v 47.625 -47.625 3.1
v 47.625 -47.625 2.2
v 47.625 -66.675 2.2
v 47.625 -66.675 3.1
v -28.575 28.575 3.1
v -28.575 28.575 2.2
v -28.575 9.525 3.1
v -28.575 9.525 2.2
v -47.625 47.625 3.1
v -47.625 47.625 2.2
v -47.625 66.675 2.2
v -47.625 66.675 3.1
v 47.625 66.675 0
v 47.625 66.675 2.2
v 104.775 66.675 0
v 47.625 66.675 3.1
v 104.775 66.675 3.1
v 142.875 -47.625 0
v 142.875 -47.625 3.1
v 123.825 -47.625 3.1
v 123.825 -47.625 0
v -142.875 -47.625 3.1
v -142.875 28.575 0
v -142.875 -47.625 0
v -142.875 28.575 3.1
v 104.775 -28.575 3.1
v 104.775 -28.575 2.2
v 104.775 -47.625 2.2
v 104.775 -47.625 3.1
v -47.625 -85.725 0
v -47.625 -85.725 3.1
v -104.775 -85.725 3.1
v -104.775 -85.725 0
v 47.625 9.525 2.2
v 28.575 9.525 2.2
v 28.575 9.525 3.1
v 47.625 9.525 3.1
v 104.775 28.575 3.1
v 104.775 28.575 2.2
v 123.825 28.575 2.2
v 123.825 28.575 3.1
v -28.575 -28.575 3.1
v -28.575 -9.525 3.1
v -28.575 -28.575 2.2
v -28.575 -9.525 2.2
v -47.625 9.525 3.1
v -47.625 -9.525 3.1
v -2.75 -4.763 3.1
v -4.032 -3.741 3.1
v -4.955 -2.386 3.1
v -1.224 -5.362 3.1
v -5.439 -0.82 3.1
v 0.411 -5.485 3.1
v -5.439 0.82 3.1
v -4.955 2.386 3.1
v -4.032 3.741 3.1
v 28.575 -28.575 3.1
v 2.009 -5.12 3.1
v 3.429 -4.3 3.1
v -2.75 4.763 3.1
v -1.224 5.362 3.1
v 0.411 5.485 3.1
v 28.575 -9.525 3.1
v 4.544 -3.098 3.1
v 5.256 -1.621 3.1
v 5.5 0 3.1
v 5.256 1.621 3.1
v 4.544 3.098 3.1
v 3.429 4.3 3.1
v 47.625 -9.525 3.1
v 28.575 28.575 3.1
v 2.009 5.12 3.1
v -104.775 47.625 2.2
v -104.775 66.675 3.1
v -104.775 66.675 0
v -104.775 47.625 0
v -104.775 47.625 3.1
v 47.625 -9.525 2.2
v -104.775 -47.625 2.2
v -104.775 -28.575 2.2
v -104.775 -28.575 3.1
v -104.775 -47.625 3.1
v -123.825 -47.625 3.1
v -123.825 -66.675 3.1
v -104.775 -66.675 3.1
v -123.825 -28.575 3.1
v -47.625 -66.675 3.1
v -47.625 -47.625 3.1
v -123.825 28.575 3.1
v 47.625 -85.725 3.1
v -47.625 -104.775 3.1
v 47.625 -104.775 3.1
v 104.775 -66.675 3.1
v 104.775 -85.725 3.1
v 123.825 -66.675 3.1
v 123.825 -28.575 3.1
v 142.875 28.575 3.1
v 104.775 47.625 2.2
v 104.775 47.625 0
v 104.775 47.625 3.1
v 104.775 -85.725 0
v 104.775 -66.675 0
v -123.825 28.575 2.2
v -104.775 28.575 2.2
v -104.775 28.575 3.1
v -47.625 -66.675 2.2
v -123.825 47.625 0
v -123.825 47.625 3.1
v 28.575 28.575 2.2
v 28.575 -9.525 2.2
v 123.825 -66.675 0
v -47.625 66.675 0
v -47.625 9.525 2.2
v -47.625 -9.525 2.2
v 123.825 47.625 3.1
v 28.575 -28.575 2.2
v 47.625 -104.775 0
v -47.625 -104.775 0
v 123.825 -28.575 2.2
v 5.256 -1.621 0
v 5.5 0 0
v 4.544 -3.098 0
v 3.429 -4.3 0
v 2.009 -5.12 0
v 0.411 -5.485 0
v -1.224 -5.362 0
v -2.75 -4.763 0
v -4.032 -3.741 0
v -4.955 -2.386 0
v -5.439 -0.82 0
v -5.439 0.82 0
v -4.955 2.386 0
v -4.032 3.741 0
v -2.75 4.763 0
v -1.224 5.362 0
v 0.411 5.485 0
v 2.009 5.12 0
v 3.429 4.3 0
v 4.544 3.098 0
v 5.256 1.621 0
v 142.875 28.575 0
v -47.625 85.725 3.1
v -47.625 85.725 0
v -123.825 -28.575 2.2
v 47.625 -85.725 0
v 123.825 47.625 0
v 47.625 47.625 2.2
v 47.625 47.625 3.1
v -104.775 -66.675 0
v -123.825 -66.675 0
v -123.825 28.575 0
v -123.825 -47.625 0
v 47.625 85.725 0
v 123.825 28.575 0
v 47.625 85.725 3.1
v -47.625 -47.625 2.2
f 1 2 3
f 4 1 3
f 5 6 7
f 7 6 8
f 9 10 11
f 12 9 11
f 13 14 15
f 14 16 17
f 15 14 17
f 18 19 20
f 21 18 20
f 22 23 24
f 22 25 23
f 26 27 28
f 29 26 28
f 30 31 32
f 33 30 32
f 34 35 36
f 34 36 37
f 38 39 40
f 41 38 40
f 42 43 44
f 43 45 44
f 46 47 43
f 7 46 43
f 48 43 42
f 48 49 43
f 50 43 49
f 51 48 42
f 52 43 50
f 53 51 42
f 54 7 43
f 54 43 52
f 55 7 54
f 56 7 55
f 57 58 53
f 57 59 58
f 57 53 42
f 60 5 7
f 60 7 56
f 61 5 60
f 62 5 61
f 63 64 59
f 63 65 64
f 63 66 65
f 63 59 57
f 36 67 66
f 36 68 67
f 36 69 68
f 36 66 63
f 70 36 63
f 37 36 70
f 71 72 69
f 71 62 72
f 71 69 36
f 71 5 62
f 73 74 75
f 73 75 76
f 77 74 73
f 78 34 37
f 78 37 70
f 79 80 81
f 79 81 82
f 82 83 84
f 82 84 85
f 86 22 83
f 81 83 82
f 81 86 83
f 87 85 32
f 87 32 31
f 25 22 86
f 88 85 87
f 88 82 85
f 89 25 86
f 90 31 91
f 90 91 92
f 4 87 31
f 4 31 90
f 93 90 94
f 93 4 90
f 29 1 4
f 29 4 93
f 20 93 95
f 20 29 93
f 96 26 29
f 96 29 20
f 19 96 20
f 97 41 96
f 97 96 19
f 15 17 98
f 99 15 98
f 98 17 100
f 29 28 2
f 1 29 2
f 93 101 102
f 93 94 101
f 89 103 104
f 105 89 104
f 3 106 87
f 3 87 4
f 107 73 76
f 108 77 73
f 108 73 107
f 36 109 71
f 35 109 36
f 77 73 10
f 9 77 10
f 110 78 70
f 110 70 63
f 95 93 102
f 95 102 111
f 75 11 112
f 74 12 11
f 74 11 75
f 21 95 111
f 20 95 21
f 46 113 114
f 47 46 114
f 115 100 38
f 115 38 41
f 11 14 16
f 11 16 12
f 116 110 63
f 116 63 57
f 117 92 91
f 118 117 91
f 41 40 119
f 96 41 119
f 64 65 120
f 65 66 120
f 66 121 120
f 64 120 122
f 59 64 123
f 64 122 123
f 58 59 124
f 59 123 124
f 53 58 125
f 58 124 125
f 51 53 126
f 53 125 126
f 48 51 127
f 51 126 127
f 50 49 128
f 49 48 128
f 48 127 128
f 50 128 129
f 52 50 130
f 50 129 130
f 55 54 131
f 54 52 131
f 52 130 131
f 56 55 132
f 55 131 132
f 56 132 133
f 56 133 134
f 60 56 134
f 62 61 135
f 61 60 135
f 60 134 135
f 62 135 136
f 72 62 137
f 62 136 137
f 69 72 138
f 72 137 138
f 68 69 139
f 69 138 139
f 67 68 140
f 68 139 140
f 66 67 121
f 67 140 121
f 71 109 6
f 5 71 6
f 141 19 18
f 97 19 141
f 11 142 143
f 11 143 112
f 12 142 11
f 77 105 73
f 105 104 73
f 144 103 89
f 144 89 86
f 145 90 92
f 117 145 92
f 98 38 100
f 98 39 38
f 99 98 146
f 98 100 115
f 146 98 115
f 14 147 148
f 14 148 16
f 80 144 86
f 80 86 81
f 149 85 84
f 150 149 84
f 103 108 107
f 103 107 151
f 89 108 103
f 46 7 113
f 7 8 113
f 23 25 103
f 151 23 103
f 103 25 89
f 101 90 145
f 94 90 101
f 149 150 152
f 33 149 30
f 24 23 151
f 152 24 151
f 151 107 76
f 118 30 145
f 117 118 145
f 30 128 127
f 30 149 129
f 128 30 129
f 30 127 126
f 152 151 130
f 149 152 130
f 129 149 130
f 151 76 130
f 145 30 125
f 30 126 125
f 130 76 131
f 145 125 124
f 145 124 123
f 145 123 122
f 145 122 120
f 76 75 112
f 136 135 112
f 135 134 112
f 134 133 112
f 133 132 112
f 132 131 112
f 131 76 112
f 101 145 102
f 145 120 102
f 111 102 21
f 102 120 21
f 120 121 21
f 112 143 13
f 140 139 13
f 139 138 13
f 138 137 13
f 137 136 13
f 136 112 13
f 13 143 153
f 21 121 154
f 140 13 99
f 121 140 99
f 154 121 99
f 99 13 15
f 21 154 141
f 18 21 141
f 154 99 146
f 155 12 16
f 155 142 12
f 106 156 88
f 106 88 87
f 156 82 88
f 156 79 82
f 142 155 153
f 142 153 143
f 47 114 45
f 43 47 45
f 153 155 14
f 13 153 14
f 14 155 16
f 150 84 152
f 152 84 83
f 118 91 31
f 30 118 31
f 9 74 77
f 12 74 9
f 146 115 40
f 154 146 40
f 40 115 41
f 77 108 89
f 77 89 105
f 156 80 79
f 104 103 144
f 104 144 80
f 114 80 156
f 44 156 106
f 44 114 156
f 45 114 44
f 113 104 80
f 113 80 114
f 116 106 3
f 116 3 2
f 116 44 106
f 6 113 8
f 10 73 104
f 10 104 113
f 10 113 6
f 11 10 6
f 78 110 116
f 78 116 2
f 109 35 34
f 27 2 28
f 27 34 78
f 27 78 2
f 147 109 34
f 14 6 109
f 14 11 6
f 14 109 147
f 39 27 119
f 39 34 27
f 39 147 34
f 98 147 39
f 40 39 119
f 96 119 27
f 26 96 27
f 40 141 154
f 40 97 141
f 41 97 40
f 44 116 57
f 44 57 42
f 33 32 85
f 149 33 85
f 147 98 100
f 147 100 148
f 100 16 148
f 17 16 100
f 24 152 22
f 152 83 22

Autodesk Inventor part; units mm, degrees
ref_plane "YZ Plane" through (0, 0, 0) normal (1, 0, 0) x (0, 1, 0)
ref_plane "XZ Plane" through (0, 0, 0) normal (0, 1, 0) x (-1, 0, 0)
ref_plane "XY Plane" through (0, 0, 0) normal (0, 0, 1) x (1, 0, 0)
sketch "Sketch1" plane through (0, 0, 0) normal (0, 0, 1) x (1, 0, 0)
  circle A0 centre (0, 0) radius 152.4
  circle A1 centre (0, 0) radius 5.5
  dimension "d0" = 304.8
  dimension "d1" = 11
extrude "Extrusion1" add sketch "Sketch1" along normal blind 2.2
fillet "Fillet1" radius 1.1 2 edges at (-152.4, 0, 0) (-152.4, 0, 2.2)
sketch "Sketch2" plane through (0, 0, 2.2) normal (0, 0, 1) x (1, 0, 0)
  line L0 (206.2137, 42.4617) -> (289.822, 42.4617) construction
  line L1 (289.822, 42.4617) -> (289.822, -13.3654) construction
  line L2 (289.822, -13.3654) -> (206.2137, -13.3654) construction
  line L3 (206.2137, -13.3654) -> (206.2137, 42.4617) construction
  line L4 (9.525, 9.525) -> (-9.525, 9.525)
  line L5 (-9.525, 9.525) -> (-9.525, -9.525)
  line L6 (-9.525, -9.525) -> (9.525, -9.525)
  line L7 (9.525, -9.525) -> (9.525, 9.525)
  line L8 (-123.825, 28.575) -> (-104.775, 28.575)
  line L9 (-85.725, 28.575) -> (-66.675, 28.575)
  line L10 (-85.725, 28.575) -> (-104.775, 28.575)
  line L11 (-9.525, 28.575) -> (-28.575, 28.575)
  line L12 (-47.625, 28.575) -> (-28.575, 28.575)
  line L13 (-47.625, 28.575) -> (-66.675, 28.575)
  line L14 (-9.525, 9.525) -> (-9.525, 28.575)
  line L15 (-9.525, 28.575) -> (9.525, 28.575)
  line L16 (9.525, 28.575) -> (9.525, 9.525)
  line L17 (-9.525, -28.575) -> (-9.525, -9.525)
  line L18 (9.525, -9.525) -> (9.525, -28.575)
  line L19 (-123.825, -47.625) -> (-142.875, -47.625)
  line L20 (-123.825, -47.625) -> (-104.775, -47.625)
  line L21 (-85.725, -47.625) -> (-104.775, -47.625)
  line L22 (-85.725, -47.625) -> (-66.675, -47.625)
  line L23 (-47.625, -47.625) -> (-66.675, -47.625)
  line L24 (-47.625, -47.625) -> (-28.575, -47.625)
  line L25 (-9.525, -47.625) -> (-28.575, -47.625)
  line L26 (-9.525, -28.575) -> (-9.525, -47.625)
  line L27 (9.525, -47.625) -> (9.525, -28.575)
  line L28 (142.875, 28.575) -> (123.825, 28.575)
  line L29 (104.775, 28.575) -> (123.825, 28.575)
  line L30 (104.775, 28.575) -> (85.725, 28.575)
  line L31 (66.675, 28.575) -> (85.725, 28.575)
  line L32 (66.675, 28.575) -> (47.625, 28.575)
  line L33 (28.575, 28.575) -> (47.625, 28.575)
  line L34 (28.575, 28.575) -> (9.525, 28.575)
  line L35 (104.775, -47.625) -> (123.825, -47.625)
  line L36 (104.775, -47.625) -> (85.725, -47.625)
  line L37 (142.875, -47.625) -> (123.825, -47.625)
  line L38 (66.675, -47.625) -> (85.725, -47.625)
  line L39 (66.675, -47.625) -> (47.625, -47.625)
  line L40 (28.575, -47.625) -> (47.625, -47.625)
  line L41 (28.575, -47.625) -> (9.525, -47.625)
  line L42 (0, 9.525) -> (0, -9.525)
  line L43 (-9.525, 0) -> (9.525, 0)
  line L44 (0, 0) -> (-4.1012, 3.8959)
  line L45 (-142.875, 28.575) -> (-123.825, 28.575)
  line L46 (-123.825, 28.575) -> (-123.825, 9.525)
  line L47 (-123.825, 9.525) -> (-142.875, 9.525)
  line L48 (-142.875, 9.525) -> (-142.875, 28.575)
  line L49 (-142.875, -9.525) -> (-123.825, -9.525)
  line L50 (-123.825, -9.525) -> (-123.825, 9.525)
  line L51 (-142.875, 9.525) -> (-142.875, -9.525)
  line L52 (-123.825, -47.625) -> (-123.825, -28.575)
  line L53 (-123.825, -28.575) -> (-142.875, -28.575)
  line L54 (-142.875, -28.575) -> (-142.875, -47.625)
  line L55 (-123.825, -9.525) -> (-123.825, -28.575)
  line L56 (-142.875, -28.575) -> (-142.875, -9.525)
  line L57 (123.825, -47.625) -> (142.875, -47.625)
  line L58 (142.875, 28.575) -> (123.825, 28.575)
  line L59 (123.825, 28.575) -> (123.825, 9.525)
  line L60 (123.825, 9.525) -> (142.875, 9.525)
  line L61 (142.875, 9.525) -> (142.875, 28.575)
  line L62 (123.825, -9.525) -> (123.825, 9.525)
  line L63 (142.875, -9.525) -> (123.825, -9.525)
  line L64 (142.875, 9.525) -> (142.875, -9.525)
  line L65 (123.825, -9.525) -> (123.825, -28.575)
  line L66 (123.825, -47.625) -> (123.825, -28.575)
  line L67 (142.875, -28.575) -> (142.875, -9.525)
  line L68 (123.825, -28.575) -> (142.875, -28.575)
  line L69 (142.875, -28.575) -> (142.875, -47.625)
  line L70 (-123.825, 28.575) -> (-104.775, 28.575)
  line L71 (-104.775, 28.575) -> (-104.775, 47.625)
  line L72 (-104.775, 47.625) -> (-123.825, 47.625)
  line L73 (-123.825, 47.625) -> (-123.825, 28.575)
  line L74 (123.825, 28.575) -> (104.775, 28.575)
  line L75 (104.775, 28.575) -> (104.775, 47.625)
  line L76 (104.775, 47.625) -> (123.825, 47.625)
  line L77 (123.825, 47.625) -> (123.825, 28.575)
  line L78 (123.825, -47.625) -> (104.775, -47.625)
  line L79 (104.775, -47.625) -> (104.775, -66.675)
  line L80 (104.775, -66.675) -> (123.825, -66.675)
  line L81 (123.825, -66.675) -> (123.825, -47.625)
  line L82 (-123.825, -47.625) -> (-104.775, -47.625)
  line L83 (-104.775, -47.625) -> (-104.775, -66.675)
  line L84 (-104.775, -66.675) -> (-123.825, -66.675)
  line L85 (-123.825, -66.675) -> (-123.825, -47.625)
  line L86 (104.775, -66.675) -> (85.725, -66.675)
  line L87 (85.725, -66.675) -> (85.725, -85.725)
  line L88 (85.725, -85.725) -> (104.775, -85.725)
  line L89 (104.775, -85.725) -> (104.775, -66.675)
  line L90 (-104.775, -66.675) -> (-85.725, -66.675)
  line L91 (-85.725, -66.675) -> (-85.725, -85.725)
  line L92 (-85.725, -85.725) -> (-104.775, -85.725)
  line L93 (-104.775, -85.725) -> (-104.775, -66.675)
  line L94 (-66.675, -66.675) -> (-85.725, -66.675)
  line L95 (-85.725, -85.725) -> (-66.675, -85.725)
  line L96 (-66.675, -85.725) -> (-66.675, -66.675)
  line L97 (-47.625, -66.675) -> (-47.625, -85.725)
  line L98 (-47.625, -85.725) -> (-66.675, -85.725)
  line L99 (-66.675, -66.675) -> (-47.625, -66.675)
  line L100 (66.675, -66.675) -> (85.725, -66.675)
  line L101 (85.725, -85.725) -> (66.675, -85.725)
  line L102 (66.675, -85.725) -> (66.675, -66.675)
  line L103 (47.625, -66.675) -> (47.625, -85.725)
  line L104 (66.675, -66.675) -> (47.625, -66.675)
  line L105 (47.625, -85.725) -> (66.675, -85.725)
  line L106 (-47.625, -85.725) -> (-28.575, -85.725)
  line L107 (-28.575, -85.725) -> (-28.575, -104.775)
  line L108 (-28.575, -104.775) -> (-47.625, -104.775)
  line L109 (-47.625, -104.775) -> (-47.625, -85.725)
  line L110 (-9.525, -85.725) -> (-28.575, -85.725)
  line L111 (-28.575, -104.775) -> (-9.525, -104.775)
  line L112 (-9.525, -104.775) -> (-9.525, -85.725)
  line L113 (28.575, -85.725) -> (9.525, -85.725)
  line L114 (9.525, -85.725) -> (9.525, -104.775)
  line L115 (9.525, -104.775) -> (28.575, -104.775)
  line L116 (28.575, -104.775) -> (28.575, -85.725)
  line L117 (-9.525, -85.725) -> (9.525, -85.725)
  line L118 (9.525, -104.775) -> (-9.525, -104.775)
  line L119 (28.575, -85.725) -> (47.625, -85.725)
  line L120 (47.625, -85.725) -> (47.625, -104.775)
  line L121 (47.625, -104.775) -> (28.575, -104.775)
  line L122 (-104.775, 47.625) -> (-85.725, 47.625)
  line L123 (-85.725, 47.625) -> (-85.725, 66.675)
  line L124 (-85.725, 66.675) -> (-104.775, 66.675)
  line L125 (-104.775, 66.675) -> (-104.775, 47.625)
  line L126 (104.775, 47.625) -> (85.725, 47.625)
  line L127 (85.725, 47.625) -> (85.725, 66.675)
  line L128 (85.725, 66.675) -> (104.775, 66.675)
  line L129 (104.775, 66.675) -> (104.775, 47.625)
  line L130 (-66.675, 47.625) -> (-85.725, 47.625)
  line L131 (-85.725, 66.675) -> (-66.675, 66.675)
  line L132 (-66.675, 66.675) -> (-66.675, 47.625)
  line L133 (-47.625, 47.625) -> (-47.625, 66.675)
  line L134 (-66.675, 47.625) -> (-47.625, 47.625)
  line L135 (-47.625, 66.675) -> (-66.675, 66.675)
  line L136 (66.675, 47.625) -> (85.725, 47.625)
  line L137 (85.725, 66.675) -> (66.675, 66.675)
  line L138 (66.675, 66.675) -> (66.675, 47.625)
  line L139 (47.625, 47.625) -> (47.625, 66.675)
  line L140 (66.675, 47.625) -> (47.625, 47.625)
  line L141 (47.625, 66.675) -> (66.675, 66.675)
  line L142 (-47.625, 66.675) -> (-28.575, 66.675)
  line L143 (-28.575, 66.675) -> (-28.575, 85.725)
  line L144 (-28.575, 85.725) -> (-47.625, 85.725)
  line L145 (-47.625, 85.725) -> (-47.625, 66.675)
  line L146 (47.625, 66.675) -> (28.575, 66.675)
  line L147 (28.575, 66.675) -> (28.575, 85.725)
  line L148 (28.575, 85.725) -> (47.625, 85.725)
  line L149 (47.625, 85.725) -> (47.625, 66.675)
  line L150 (-9.525, 66.675) -> (-28.575, 66.675)
  line L151 (-28.575, 85.725) -> (-9.525, 85.725)
  line L152 (-9.525, 85.725) -> (-9.525, 66.675)
  line L153 (28.575, 66.675) -> (9.525, 66.675)
  line L154 (9.525, 66.675) -> (9.525, 85.725)
  line L155 (9.525, 85.725) -> (28.575, 85.725)
  line L156 (28.575, 85.725) -> (28.575, 66.675)
  line L157 (-9.525, 66.675) -> (9.525, 66.675)
  line L158 (9.525, 85.725) -> (-9.525, 85.725)
  circle A0 centre (0, 0) radius 225.16
  point P0 (-123.825, -9.525)
  point P1 (-123.825, -47.625)
  point P2 (123.825, -9.525)
  dimension "d22" = 19.05
  dimension "d23" = 19.05
  dimension "d29" = 19.05
  dimension "d30" = 19.05
  dimension "d31" = 19.05
  dimension "d32" = 19.05
  dimension "d33" = 19.05
  dimension "d34" = 19.05
  dimension "d35" = 19.05
  dimension "d36" = 19.05
  dimension "d39" = 19.05
  dimension "d40" = 19.05
  dimension "d45" = 19.05
  dimension "d46" = 19.05
  dimension "d50" = 19.05
  dimension "d51" = 19.05
  dimension "d52" = 19.05
  dimension "d53" = 19.05
  dimension "d58" = 19.05
  dimension "d59" = 19.05
  dimension "d60" = 19.05
  dimension "d61" = 19.05
extrude "Extrusion2" cut sketch "Sketch2" against normal blind 25.4
sketch "Sketch3" plane through (0, 0, 2.2) normal (0, 0, 1) x (1, 0, 0)
  line L0 (194.8549, 38.1597) -> (278.4632, 38.1597) construction
  line L1 (278.4632, 38.1597) -> (278.4632, -17.6674) construction
  line L2 (278.4632, -17.6674) -> (194.8549, -17.6674) construction
  line L3 (194.8549, -17.6674) -> (194.8549, 38.1597) construction
  line L4 (-123.825, 28.575) -> (-104.775, 28.575)
  line L5 (-123.825, -47.625) -> (-142.875, -47.625)
  line L6 (104.775, 28.575) -> (123.825, 28.575)
  line L7 (142.875, 28.575) -> (123.825, 28.575)
  line L8 (142.875, -47.625) -> (123.825, -47.625)
  line L9 (-142.875, 28.575) -> (-123.825, 28.575)
  line L10 (-123.825, 28.575) -> (-123.825, 9.525)
  line L11 (-142.875, 9.525) -> (-142.875, 28.575)
  line L12 (-123.825, -9.525) -> (-123.825, 9.525)
  line L13 (-142.875, 9.525) -> (-142.875, -9.525)
  line L14 (-123.825, -9.525) -> (-123.825, -28.575)
  line L15 (-142.875, -28.575) -> (-142.875, -9.525)
  line L16 (-142.875, -28.575) -> (-142.875, -47.625)
  line L17 (123.825, -9.525) -> (123.825, 9.525)
  line L18 (142.875, 9.525) -> (142.875, -9.525)
  line L19 (123.825, 28.575) -> (123.825, 9.525)
  line L20 (142.875, 9.525) -> (142.875, 28.575)
  line L21 (142.875, 28.575) -> (123.825, 28.575)
  line L22 (123.825, -9.525) -> (123.825, -28.575)
  line L23 (142.875, -28.575) -> (142.875, -9.525)
  line L24 (142.875, -28.575) -> (142.875, -47.625)
  line L25 (123.825, -47.625) -> (142.875, -47.625)
  line L26 (-123.825, 28.575) -> (-104.775, 28.575)
  line L27 (-104.775, 28.575) -> (-104.775, 47.625)
  line L28 (-104.775, 47.625) -> (-123.825, 47.625)
  line L29 (-123.825, 47.625) -> (-123.825, 28.575)
  line L30 (123.825, 28.575) -> (104.775, 28.575)
  line L31 (104.775, 28.575) -> (104.775, 47.625)
  line L32 (104.775, 47.625) -> (123.825, 47.625)
  line L33 (123.825, 47.625) -> (123.825, 28.575)
  line L34 (104.775, -66.675) -> (123.825, -66.675)
  line L35 (123.825, -66.675) -> (123.825, -47.625)
  line L36 (-104.775, -66.675) -> (-123.825, -66.675)
  line L37 (-123.825, -66.675) -> (-123.825, -47.625)
  line L38 (85.725, -85.725) -> (104.775, -85.725)
  line L39 (104.775, -85.725) -> (104.775, -66.675)
  line L40 (-85.725, -85.725) -> (-104.775, -85.725)
  line L41 (-104.775, -85.725) -> (-104.775, -66.675)
  line L42 (-85.725, -85.725) -> (-66.675, -85.725)
  line L43 (-47.625, -85.725) -> (-66.675, -85.725)
  line L44 (85.725, -85.725) -> (66.675, -85.725)
  line L45 (47.625, -85.725) -> (66.675, -85.725)
  line L46 (-28.575, -104.775) -> (-47.625, -104.775)
  line L47 (-47.625, -104.775) -> (-47.625, -85.725)
  line L48 (-28.575, -104.775) -> (-9.525, -104.775)
  line L49 (9.525, -104.775) -> (-9.525, -104.775)
  line L50 (9.525, -104.775) -> (28.575, -104.775)
  line L51 (47.625, -85.725) -> (47.625, -104.775)
  line L52 (47.625, -104.775) -> (28.575, -104.775)
  line L53 (-104.775, 47.625) -> (-85.725, 47.625)
  line L54 (-85.725, 66.675) -> (-104.775, 66.675)
  line L55 (-104.775, 66.675) -> (-104.775, 47.625)
  line L56 (104.775, 66.675) -> (104.775, 47.625)
  line L57 (-66.675, 47.625) -> (-85.725, 47.625)
  line L58 (-85.725, 66.675) -> (-66.675, 66.675)
  line L59 (-66.675, 47.625) -> (-47.625, 47.625)
  line L60 (-47.625, 66.675) -> (-66.675, 66.675)
  line L61 (-47.625, 47.625) -> (-47.625, 66.675)
  line L62 (-47.625, 85.725) -> (-47.625, 66.675)
  circle A0 centre (0, 0) radius 225.16
  line L63 (-47.625, 85.725) -> (47.625, 85.725)
  line L64 (47.625, 85.725) -> (47.625, 66.675)
  line L65 (47.625, 66.675) -> (-47.625, 66.675)
  line L66 (-47.625, 66.675) -> (-47.625, 85.725)
  line L67 (47.625, 66.675) -> (104.775, 66.675)
  line L68 (104.775, 66.675) -> (104.775, 47.625)
  line L69 (104.775, 47.625) -> (47.625, 47.625)
  line L70 (47.625, 47.625) -> (47.625, 66.675)
  line L71 (-123.825, -28.575) -> (-104.775, -28.575)
  line L72 (-104.775, -28.575) -> (-104.775, -47.625)
  line L73 (-104.775, -47.625) -> (-85.725, -47.625)
  line L74 (-85.725, -47.625) -> (-47.625, -47.625)
  line L75 (-47.625, -47.625) -> (-47.625, -66.675)
  line L76 (-47.625, -66.675) -> (47.625, -66.675)
  line L77 (104.775, -47.625) -> (47.625, -47.625)
  line L78 (47.625, -47.625) -> (47.625, -66.675)
  line L79 (123.825, -28.575) -> (104.775, -28.575)
  line L80 (104.775, -28.575) -> (104.775, -47.625)
  line L81 (9.525, -28.575) -> (-9.525, -28.575)
  line L82 (28.575, -9.525) -> (28.575, -28.575)
  line L83 (28.575, -28.575) -> (9.525, -28.575)
  line L84 (-28.575, -9.525) -> (-28.575, -28.575)
  line L85 (-28.575, -28.575) -> (-9.525, -28.575)
  line L86 (-9.525, 28.575) -> (-28.575, 28.575)
  line L87 (-28.575, 28.575) -> (-28.575, 9.525)
  line L88 (-9.525, 28.575) -> (9.525, 28.575)
  line L89 (9.525, 28.575) -> (28.575, 28.575)
  line L90 (28.575, 28.575) -> (28.575, 9.525)
  line L91 (28.575, 9.525) -> (47.625, 9.525)
  line L92 (47.625, 9.525) -> (47.625, -9.525)
  line L93 (47.625, -9.525) -> (28.575, -9.525)
  line L94 (-28.575, 9.525) -> (-47.625, 9.525)
  line L95 (-47.625, 9.525) -> (-47.625, -9.525)
  line L96 (-47.625, -9.525) -> (-28.575, -9.525)
  circle A1 centre (0, 0) radius 5.5
  point P0 (-123.825, -9.525)
  point P1 (-123.825, -47.625)
  point P2 (123.825, -9.525)
  point P3 (112.4662, 24.273)
  point P4 (112.4662, -51.927)
  point P5 (-135.1838, -51.927)
  dimension "d94" = 19.05
  dimension "d96" = 19.05
  dimension "d97" = 19.05
  dimension "d98" = 19.05
  dimension "d99" = 19.05
  dimension "d100" = 19.05
  dimension "d102" = 19.05
  dimension "d103" = 19.05
  dimension "d104" = 19.05
  dimension "d105" = 19.05
extrude "Extrusion3" add sketch "Sketch3" along normal blind 0.9 contours L29 L28 L27 L4 | L10 L12 L14 L71 L72 L73 L74 L75 L76 L78 L77 L80 L79 L22 L17 L19 L7 L20 L18 L23 L24 L8 L35 L34 L39 L38 L44 L45 L51 L52 L50 L49 L48 L46 L47 L43 L42 L40 L41 L36 L37 L5 L16 L15 L13 L11 L9 | L55 L54 L58 L60 L61 L59 L57 L53 | L62 L63 L64 L65 | L67 L56 L69 L70 | L32 L33 L6 L31 | L81 L85 L84 L96 L95 L94 L87 L86 L88 L89 L90 L91 L92 L93 L82 L83
properties part number "horizantal cut norm center"
